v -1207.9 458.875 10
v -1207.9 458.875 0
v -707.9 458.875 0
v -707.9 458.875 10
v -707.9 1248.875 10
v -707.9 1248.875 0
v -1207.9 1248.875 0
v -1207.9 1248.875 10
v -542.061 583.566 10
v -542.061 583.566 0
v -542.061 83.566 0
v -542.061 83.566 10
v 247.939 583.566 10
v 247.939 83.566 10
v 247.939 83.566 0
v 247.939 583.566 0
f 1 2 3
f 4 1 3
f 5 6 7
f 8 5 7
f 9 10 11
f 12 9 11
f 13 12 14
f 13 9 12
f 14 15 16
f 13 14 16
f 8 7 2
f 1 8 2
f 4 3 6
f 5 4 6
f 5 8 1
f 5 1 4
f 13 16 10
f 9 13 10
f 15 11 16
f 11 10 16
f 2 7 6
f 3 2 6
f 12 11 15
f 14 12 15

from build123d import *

# Parameters (mm, degrees)
F0_W     = 450
F0_H     = 25
F0_W_2   = 25
F0_H_2   = 740
F1_DEPTH = 10
F0_H_3   = 450
F0_W_3   = 740


# Not quite as in the source:
# - a feature names something its author has since deleted; it is built from what else it names


with BuildPart() as f1:
    # F0 (on Top) → F1 (new body)
    with BuildSketch(Plane.XY):
        Polygon((-1182.8998201413, 1223.8749871956), (-1182.8998201413, 953.8749871956), (-1182.8998201413, 653.8749871956), (-1182.8998201413, 483.8749871956), (-732.8998201413, 483.8749871956), (-732.8998201413, 1223.8749871956), align=None)
        Polygon((-1182.8998201413, 653.8749871956), (-1182.8998201413, 953.8749871956), (-1182.8998201413, 1223.8749871956), (-1182.8998201413, 1248.8749871956), (-1207.8998201413, 1248.8749871956), (-1207.8998201413, 483.8749871956), (-1182.8998201413, 483.8749871956), align=None)
        with Locations((-957.8998201413, 1236.3749871956)):
            Rectangle(F0_W, F0_H)
        with Locations((-957.8998201413, 471.3749871956)):
            Rectangle(F0_W, F0_H)
        with Locations((-1195.3998201413, 471.3749871956)):
            Rectangle(F0_W_2, F0_H)
        with Locations((-720.3998201413, 853.8749871956)):
            Rectangle(F0_W_2, F0_H_2)
        with Locations((-720.3998201413, 1236.3749871956)):
            Rectangle(F0_W_2, F0_H)
        with Locations((-720.3998201413, 471.3749871956)):
            Rectangle(F0_W_2, F0_H)
    extrude(amount=F1_DEPTH)


with BuildPart() as f1b:
    # F0 (on Top) → F1, piece 2 (new body)
    with BuildSketch(Plane.XY):
        Polygon((-517.0606966229, 108.5655740079), (-347.0606966229, 108.5655740079), (-47.0606966229, 108.5655740079), (222.9393033771, 108.5655740079), (222.9393033771, 558.5655740079), (-517.0606966229, 558.5655740079), align=None)
        Polygon((-47.0606966229, 108.5655740079), (-347.0606966229, 108.5655740079), (-517.0606966229, 108.5655740079), (-517.0606966229, 83.5655740079), (-309.5606966229, 83.5655740079), (-284.5606966229, 83.5655740079), (-9.5606966229, 83.5655740079), (15.4393033771, 83.5655740079), (247.9393033771, 83.5655740079), (247.9393033771, 108.5655740079), (222.9393033771, 108.5655740079), align=None)
        with Locations((-529.5606966229, 96.0655740079)):
            Rectangle(F0_W_2, F0_H)
        with Locations((-529.5606966229, 333.5655740079)):
            Rectangle(F0_W_2, F0_H_3)
        with Locations((235.4393033771, 333.5655740079)):
            Rectangle(F0_W_2, F0_H_3)
        with Locations((-147.0606966229, 571.0655740079)):
            Rectangle(F0_W_3, F0_H)
        with Locations((-529.5606966229, 571.0655740079)):
            Rectangle(F0_W_2, F0_H)
        with Locations((235.4393033771, 571.0655740079)):
            Rectangle(F0_W_2, F0_H)
    extrude(amount=F1_DEPTH)


solid = Compound([f1.part, f1b.part])
